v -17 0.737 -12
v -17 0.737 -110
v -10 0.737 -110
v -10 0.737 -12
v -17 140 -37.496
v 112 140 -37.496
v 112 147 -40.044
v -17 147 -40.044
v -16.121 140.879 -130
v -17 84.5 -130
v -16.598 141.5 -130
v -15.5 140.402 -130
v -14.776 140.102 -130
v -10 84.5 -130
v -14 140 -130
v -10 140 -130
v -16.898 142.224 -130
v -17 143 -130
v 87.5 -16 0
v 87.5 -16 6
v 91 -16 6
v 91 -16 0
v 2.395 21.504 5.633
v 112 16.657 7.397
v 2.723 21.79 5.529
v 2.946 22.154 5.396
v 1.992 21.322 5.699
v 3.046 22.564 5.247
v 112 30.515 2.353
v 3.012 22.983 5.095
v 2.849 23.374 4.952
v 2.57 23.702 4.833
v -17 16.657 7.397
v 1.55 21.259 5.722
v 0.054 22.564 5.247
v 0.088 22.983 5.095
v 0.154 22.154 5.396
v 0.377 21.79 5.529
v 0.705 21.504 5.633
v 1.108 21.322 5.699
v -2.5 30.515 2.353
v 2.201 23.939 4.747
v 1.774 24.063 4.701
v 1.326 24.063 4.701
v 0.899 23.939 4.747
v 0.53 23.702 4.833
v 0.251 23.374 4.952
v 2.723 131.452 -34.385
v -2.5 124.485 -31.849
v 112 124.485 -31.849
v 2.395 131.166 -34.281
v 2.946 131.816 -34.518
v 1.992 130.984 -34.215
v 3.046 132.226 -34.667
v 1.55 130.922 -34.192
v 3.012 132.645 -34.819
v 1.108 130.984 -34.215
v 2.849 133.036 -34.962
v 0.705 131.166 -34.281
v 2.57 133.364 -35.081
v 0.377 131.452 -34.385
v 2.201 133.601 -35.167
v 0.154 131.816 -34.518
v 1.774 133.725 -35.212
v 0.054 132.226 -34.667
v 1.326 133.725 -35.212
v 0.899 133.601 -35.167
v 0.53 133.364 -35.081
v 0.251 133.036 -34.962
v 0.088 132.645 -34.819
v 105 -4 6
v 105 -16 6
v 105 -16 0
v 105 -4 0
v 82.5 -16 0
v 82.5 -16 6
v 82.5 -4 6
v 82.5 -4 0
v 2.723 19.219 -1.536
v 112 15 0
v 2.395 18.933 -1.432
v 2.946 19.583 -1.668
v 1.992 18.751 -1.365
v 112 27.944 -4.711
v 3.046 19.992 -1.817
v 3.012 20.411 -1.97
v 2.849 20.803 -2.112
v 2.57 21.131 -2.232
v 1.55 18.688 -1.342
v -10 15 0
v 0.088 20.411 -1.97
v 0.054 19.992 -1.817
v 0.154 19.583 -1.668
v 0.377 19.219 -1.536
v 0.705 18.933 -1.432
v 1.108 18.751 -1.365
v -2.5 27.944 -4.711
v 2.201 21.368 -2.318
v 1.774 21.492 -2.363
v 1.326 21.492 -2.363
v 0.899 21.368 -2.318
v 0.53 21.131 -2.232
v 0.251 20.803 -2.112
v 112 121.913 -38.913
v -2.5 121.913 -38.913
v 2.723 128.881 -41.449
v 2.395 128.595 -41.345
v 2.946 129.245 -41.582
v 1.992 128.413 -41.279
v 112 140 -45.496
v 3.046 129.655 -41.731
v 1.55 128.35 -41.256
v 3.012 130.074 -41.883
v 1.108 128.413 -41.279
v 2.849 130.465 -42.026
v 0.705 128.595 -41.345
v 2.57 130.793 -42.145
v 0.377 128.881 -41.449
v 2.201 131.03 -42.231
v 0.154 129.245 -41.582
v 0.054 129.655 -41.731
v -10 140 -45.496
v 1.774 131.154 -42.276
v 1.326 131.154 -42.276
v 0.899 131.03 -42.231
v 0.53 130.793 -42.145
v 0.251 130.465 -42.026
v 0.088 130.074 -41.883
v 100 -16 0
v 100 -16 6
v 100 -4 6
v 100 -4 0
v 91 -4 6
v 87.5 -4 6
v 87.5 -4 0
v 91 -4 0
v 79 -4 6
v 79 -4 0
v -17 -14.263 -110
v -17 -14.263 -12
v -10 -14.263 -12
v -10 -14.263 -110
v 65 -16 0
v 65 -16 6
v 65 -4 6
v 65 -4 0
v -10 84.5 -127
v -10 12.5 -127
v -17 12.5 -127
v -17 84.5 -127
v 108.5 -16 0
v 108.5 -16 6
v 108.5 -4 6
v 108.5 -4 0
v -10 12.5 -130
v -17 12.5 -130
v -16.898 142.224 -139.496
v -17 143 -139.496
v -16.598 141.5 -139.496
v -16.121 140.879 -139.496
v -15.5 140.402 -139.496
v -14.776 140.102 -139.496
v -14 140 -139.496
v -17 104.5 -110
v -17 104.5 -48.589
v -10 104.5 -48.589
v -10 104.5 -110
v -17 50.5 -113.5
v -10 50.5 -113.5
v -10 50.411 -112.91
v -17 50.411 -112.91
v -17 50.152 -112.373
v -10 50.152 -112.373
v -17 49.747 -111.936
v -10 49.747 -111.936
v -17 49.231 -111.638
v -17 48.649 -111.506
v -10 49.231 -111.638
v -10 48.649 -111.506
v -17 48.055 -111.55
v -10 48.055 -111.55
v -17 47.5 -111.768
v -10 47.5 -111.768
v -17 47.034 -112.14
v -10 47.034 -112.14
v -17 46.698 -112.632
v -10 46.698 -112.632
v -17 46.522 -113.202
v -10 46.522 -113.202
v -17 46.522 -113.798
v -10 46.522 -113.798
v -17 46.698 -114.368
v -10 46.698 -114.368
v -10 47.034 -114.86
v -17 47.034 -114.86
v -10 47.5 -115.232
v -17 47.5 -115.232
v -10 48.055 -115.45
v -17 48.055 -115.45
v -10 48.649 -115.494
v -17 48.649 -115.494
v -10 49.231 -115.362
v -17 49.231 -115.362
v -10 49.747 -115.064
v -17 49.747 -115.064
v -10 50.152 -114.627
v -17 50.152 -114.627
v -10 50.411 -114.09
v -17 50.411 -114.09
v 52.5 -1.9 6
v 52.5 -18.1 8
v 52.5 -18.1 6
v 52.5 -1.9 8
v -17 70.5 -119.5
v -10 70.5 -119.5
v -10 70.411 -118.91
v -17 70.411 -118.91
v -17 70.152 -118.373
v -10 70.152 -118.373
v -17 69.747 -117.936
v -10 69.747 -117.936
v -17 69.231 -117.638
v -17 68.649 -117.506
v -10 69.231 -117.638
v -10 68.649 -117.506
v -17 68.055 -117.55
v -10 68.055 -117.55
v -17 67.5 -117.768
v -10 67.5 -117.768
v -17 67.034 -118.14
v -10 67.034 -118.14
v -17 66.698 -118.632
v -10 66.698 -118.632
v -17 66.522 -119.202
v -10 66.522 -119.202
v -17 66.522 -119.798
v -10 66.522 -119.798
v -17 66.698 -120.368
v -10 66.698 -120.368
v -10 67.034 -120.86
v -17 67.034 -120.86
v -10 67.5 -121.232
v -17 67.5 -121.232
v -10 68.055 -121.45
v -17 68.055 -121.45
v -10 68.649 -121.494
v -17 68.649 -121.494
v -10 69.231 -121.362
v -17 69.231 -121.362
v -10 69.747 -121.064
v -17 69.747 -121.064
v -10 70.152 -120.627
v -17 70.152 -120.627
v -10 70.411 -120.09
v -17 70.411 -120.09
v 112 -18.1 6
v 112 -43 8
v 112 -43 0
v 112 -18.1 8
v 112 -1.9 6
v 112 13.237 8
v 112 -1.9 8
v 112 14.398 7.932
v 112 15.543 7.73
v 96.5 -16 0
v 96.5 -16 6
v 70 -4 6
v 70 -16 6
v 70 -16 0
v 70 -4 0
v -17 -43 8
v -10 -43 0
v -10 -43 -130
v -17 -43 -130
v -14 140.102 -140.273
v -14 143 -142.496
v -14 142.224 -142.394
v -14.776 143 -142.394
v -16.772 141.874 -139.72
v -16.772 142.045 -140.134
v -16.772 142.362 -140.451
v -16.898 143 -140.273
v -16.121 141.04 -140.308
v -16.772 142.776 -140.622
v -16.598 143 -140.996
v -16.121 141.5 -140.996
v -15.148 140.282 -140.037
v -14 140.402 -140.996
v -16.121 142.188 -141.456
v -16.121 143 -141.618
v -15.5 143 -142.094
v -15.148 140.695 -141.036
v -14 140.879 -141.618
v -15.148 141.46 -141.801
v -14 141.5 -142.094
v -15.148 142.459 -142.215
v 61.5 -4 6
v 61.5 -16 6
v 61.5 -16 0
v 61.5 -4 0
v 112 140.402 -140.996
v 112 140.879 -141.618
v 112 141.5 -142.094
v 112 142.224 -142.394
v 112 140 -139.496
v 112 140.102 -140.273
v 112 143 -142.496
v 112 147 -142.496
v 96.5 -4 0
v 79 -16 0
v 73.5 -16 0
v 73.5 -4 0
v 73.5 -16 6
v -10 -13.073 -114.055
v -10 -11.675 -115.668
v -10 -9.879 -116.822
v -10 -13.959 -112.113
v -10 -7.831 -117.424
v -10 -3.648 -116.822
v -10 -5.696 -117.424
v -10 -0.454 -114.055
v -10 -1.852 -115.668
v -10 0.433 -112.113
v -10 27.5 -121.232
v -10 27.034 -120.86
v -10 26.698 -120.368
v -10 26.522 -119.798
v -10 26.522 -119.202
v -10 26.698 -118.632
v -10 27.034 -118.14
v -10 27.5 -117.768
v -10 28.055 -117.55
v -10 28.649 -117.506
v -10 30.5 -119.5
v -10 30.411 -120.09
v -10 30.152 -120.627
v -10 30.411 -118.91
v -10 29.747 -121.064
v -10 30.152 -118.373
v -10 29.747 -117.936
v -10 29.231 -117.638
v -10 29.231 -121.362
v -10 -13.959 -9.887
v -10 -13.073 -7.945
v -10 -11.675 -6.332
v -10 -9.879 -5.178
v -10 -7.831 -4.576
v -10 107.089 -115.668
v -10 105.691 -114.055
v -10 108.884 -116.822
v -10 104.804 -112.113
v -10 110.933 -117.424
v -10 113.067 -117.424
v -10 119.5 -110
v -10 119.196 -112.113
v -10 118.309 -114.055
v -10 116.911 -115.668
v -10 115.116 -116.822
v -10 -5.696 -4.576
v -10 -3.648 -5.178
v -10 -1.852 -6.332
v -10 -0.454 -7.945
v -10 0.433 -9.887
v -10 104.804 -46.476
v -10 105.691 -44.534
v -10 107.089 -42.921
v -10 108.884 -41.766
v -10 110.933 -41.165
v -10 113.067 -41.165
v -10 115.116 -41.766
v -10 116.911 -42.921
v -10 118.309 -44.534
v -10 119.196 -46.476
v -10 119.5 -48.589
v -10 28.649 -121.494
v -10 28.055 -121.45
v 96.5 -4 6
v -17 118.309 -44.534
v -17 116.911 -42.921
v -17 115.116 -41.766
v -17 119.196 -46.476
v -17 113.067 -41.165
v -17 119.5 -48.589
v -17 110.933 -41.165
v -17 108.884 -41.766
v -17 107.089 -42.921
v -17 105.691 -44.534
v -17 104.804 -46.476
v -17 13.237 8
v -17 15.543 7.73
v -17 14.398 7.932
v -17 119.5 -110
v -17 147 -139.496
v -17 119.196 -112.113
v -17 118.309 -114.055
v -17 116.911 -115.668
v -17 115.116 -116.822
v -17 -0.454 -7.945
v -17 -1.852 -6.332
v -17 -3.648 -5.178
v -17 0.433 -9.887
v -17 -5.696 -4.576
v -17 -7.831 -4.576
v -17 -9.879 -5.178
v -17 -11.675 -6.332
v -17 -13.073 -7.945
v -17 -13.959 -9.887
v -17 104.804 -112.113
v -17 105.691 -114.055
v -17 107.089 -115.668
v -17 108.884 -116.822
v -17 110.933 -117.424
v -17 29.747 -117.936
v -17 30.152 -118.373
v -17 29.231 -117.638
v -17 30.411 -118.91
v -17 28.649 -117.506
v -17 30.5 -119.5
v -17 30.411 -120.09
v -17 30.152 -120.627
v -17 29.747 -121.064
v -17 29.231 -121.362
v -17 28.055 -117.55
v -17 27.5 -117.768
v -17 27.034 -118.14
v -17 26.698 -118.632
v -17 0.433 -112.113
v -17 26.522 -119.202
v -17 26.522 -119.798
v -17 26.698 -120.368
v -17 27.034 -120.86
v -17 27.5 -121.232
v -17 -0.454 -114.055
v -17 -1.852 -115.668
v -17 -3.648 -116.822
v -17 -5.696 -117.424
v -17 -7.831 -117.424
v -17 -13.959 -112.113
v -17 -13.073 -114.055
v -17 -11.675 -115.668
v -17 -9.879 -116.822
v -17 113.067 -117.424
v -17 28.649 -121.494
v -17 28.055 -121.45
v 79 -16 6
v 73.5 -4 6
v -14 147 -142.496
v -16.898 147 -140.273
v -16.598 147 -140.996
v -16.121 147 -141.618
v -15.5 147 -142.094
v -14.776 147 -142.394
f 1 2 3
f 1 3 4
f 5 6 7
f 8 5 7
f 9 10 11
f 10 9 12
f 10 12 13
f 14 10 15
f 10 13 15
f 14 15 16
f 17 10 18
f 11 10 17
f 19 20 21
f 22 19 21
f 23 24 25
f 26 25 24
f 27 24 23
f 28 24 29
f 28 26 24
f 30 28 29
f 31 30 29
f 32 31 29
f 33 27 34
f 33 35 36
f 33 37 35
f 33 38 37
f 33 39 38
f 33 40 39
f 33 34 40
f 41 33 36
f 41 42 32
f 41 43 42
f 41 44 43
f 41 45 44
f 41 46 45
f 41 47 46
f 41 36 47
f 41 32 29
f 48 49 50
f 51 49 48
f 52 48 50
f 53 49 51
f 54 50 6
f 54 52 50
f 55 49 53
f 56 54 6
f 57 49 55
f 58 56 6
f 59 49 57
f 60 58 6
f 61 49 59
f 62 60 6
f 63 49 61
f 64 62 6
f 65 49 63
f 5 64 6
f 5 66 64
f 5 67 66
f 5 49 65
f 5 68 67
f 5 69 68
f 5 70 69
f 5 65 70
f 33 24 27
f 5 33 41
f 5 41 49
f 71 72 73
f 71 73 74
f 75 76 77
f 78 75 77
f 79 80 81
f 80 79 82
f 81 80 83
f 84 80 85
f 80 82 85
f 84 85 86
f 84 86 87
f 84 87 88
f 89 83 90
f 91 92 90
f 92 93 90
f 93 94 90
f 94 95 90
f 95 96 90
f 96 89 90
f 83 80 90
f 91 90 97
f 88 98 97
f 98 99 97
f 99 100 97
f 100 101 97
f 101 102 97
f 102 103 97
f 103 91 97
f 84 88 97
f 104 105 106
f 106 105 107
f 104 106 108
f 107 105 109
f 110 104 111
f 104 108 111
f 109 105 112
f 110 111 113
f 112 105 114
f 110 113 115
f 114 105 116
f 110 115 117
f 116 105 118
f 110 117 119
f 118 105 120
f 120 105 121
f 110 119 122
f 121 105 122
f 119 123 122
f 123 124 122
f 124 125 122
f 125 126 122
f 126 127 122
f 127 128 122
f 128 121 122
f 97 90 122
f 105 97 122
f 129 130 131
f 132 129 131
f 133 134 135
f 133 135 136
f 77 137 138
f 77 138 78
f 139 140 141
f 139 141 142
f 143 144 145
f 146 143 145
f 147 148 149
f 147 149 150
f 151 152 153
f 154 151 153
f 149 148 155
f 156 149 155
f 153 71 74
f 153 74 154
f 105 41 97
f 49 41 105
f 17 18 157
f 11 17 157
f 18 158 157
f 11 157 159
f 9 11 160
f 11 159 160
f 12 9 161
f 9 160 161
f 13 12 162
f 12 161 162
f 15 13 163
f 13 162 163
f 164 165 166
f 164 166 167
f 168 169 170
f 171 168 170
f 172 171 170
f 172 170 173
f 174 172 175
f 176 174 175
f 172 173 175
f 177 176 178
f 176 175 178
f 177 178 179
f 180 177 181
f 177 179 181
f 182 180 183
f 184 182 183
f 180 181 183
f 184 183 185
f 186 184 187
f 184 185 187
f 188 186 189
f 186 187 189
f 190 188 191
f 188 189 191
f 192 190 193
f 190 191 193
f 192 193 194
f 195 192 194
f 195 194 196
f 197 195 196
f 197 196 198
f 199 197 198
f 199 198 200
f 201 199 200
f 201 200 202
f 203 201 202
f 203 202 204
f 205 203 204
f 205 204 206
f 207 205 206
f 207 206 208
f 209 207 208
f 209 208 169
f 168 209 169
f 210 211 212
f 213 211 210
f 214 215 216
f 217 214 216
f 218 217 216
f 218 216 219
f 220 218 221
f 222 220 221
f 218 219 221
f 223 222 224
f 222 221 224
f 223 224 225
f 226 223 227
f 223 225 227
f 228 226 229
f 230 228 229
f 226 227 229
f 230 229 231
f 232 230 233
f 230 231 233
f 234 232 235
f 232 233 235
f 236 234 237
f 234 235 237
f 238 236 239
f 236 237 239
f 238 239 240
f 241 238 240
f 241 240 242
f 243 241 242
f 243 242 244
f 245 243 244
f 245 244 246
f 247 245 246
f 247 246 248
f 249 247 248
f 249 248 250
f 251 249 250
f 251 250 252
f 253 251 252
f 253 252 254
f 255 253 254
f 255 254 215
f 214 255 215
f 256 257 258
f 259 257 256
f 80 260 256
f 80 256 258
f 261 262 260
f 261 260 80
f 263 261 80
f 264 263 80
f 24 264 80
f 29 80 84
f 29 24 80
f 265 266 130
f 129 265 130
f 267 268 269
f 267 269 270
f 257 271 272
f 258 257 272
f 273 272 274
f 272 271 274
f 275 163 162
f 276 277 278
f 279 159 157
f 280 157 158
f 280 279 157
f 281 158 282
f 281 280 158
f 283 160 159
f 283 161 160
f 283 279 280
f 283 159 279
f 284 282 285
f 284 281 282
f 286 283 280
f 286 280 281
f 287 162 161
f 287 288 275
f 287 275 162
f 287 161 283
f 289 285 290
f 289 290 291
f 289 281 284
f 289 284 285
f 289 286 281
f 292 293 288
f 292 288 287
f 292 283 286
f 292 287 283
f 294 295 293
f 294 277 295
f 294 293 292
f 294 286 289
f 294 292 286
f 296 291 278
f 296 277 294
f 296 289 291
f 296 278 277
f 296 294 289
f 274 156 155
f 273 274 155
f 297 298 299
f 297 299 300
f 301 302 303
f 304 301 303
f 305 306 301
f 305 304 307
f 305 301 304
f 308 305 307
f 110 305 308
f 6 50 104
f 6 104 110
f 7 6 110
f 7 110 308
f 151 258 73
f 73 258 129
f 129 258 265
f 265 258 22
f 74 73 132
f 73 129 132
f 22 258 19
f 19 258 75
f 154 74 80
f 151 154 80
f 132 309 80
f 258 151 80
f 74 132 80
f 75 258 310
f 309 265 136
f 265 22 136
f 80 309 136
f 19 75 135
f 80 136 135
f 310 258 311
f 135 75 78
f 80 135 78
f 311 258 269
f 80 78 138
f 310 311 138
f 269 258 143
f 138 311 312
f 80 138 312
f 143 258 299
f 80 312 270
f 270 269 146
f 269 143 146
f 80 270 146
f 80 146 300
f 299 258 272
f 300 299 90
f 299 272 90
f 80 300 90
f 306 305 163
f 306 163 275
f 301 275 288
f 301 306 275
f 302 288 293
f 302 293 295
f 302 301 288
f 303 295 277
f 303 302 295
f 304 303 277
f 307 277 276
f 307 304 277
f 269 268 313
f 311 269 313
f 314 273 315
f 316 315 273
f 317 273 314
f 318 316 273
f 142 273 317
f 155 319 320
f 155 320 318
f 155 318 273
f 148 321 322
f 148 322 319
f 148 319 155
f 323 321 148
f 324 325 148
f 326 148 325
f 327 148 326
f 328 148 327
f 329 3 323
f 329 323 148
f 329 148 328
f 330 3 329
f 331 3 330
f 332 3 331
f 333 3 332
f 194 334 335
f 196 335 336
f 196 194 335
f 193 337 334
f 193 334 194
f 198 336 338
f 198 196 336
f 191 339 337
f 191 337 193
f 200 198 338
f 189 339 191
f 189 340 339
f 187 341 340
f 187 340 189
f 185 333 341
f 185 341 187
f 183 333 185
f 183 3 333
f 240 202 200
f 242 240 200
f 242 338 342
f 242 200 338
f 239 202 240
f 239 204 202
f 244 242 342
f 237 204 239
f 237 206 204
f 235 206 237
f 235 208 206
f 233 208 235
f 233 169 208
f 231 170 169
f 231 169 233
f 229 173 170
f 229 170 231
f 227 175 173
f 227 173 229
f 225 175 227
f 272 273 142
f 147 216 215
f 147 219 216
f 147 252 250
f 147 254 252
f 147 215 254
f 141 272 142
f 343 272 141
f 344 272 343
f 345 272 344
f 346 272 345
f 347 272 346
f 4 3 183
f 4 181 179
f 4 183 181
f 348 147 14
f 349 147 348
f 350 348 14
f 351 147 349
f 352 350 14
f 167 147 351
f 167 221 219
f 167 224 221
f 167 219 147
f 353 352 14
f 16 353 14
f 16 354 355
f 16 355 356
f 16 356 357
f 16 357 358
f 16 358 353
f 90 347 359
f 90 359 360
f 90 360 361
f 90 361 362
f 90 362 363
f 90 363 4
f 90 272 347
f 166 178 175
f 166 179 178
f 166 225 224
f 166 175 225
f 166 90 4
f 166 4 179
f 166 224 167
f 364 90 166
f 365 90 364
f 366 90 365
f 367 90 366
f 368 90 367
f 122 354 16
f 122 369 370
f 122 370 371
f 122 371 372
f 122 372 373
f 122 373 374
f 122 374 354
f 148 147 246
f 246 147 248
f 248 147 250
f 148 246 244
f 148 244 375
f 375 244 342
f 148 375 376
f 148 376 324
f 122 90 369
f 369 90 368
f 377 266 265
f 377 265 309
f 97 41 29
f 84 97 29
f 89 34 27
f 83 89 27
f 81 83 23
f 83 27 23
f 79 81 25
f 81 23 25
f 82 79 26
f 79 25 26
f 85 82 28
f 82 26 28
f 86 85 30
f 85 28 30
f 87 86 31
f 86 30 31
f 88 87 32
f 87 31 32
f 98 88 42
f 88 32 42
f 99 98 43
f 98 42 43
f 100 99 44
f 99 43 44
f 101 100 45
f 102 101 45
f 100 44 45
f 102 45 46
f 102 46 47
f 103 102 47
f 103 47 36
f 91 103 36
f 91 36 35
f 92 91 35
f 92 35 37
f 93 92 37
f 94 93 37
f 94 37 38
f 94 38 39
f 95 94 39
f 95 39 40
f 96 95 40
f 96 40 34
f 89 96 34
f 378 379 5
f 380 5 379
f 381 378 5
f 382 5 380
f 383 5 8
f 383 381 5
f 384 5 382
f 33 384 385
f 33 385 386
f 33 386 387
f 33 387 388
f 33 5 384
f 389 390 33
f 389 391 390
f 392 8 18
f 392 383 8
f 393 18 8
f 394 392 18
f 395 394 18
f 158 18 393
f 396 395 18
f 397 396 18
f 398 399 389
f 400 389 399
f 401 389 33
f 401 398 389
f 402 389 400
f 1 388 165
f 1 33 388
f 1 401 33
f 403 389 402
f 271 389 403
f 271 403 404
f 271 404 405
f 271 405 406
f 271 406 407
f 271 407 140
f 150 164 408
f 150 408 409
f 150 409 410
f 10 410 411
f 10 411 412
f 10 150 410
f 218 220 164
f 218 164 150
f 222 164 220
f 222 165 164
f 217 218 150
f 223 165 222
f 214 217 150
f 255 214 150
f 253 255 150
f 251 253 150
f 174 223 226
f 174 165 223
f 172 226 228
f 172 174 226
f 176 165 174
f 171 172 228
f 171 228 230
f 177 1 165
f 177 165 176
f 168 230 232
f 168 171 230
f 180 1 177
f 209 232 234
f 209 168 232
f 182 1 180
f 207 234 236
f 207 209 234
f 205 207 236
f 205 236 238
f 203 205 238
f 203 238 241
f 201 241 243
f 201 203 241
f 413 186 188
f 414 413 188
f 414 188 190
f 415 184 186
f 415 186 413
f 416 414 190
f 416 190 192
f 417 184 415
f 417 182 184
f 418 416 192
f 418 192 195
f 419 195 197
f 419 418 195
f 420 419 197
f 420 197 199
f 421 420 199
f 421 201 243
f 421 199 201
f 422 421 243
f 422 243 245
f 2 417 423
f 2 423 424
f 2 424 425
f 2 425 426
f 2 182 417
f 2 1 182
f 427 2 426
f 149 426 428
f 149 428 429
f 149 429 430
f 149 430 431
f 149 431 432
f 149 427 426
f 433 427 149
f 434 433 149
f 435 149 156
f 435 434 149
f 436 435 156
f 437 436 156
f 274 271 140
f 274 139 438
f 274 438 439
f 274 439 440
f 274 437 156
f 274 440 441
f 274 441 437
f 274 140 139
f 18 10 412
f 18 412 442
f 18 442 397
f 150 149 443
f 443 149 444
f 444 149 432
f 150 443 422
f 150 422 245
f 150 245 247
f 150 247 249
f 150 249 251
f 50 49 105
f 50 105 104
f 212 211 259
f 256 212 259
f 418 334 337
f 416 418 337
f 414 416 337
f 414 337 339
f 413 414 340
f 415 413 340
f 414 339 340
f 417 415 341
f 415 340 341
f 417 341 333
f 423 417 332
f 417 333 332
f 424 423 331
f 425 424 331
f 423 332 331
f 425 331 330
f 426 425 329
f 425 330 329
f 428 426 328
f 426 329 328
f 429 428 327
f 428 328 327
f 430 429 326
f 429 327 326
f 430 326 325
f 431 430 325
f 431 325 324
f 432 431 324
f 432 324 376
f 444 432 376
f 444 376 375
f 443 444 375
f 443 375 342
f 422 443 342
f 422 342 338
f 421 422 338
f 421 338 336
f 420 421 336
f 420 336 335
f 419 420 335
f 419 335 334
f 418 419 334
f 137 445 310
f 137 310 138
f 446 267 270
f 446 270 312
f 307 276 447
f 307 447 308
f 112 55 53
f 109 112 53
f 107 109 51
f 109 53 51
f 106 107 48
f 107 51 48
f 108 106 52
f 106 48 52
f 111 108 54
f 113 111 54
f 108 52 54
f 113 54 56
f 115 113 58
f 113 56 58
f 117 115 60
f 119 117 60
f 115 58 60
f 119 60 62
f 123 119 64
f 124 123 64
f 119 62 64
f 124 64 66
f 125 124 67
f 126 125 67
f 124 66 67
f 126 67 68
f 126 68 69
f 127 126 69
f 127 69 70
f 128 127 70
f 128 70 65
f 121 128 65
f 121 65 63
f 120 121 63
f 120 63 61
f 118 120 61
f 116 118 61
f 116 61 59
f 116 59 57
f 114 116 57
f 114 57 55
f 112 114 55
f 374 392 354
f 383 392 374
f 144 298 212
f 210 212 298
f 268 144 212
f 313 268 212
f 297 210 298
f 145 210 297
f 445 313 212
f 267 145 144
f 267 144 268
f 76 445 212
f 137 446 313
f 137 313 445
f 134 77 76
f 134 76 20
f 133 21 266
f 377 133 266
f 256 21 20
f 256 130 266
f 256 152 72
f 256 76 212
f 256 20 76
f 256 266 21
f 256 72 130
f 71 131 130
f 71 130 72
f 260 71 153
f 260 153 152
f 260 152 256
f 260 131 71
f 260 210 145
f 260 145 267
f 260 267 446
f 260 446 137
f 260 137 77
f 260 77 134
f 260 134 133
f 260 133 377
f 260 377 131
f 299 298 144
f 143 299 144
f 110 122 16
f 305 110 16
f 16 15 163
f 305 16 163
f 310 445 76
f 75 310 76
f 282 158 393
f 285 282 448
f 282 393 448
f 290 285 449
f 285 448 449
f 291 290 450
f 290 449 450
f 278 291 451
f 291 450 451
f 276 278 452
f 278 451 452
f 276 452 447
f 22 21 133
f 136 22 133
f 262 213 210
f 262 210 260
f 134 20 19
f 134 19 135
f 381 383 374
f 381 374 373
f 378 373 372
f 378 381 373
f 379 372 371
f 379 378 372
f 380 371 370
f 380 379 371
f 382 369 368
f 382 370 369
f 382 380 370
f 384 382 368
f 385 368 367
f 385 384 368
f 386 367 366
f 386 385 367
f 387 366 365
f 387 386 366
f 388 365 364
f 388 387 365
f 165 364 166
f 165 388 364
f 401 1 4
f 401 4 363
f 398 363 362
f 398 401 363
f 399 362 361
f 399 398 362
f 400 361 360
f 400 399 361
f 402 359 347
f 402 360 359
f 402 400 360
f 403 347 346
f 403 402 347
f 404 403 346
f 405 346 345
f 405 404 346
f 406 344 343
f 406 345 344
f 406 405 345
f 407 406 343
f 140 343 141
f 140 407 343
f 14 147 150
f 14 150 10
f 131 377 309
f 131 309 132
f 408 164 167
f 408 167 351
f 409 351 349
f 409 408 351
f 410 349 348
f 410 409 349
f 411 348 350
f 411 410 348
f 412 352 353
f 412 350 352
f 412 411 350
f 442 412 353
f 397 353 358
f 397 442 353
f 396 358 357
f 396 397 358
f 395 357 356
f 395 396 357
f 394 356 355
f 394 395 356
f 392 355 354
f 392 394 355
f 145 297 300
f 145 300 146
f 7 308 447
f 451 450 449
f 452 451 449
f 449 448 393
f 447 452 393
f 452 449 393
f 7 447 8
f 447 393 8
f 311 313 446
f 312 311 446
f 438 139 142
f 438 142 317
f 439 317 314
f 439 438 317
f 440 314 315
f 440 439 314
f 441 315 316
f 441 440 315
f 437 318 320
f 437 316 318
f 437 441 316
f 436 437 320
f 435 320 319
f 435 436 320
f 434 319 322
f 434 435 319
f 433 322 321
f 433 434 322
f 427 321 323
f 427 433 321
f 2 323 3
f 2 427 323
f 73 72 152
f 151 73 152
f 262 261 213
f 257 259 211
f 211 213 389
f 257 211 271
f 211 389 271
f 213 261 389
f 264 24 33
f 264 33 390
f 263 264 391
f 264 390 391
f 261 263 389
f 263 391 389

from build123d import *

# Parameters (mm, degrees)
SKETCH1_W                = 170
SKETCH1_H                = 130
BOSS_EXTRUDE1_DEPTH      = 8
SKETCH2_R                = 1.5
SKETCH2_W                = 165
SKETCH2_H                = 100
CUT_EXTRUDE1_DEPTH       = 21
SKETCH3_W                = 170
SKETCH3_H                = 20
BOSS_EXTRUDE2_DEPTH      = 8
SKETCH4_W                = 65
SKETCH4_H                = 16.2
CUT_EXTRUDE2_DEPTH       = 2
SKETCH5_W                = 3.5
SKETCH5_H                = 12
CUT_EXTRUDE3_DEPTH       = 35
SKETCH6_W                = 170
SKETCH6_H                = 150
BOSS_EXTRUDE3_DEPTH      = 8
BOSS_EXTRUDE4_DEPTH      = 138
SKETCH8_W                = 249
SKETCH8_H                = 138
BOSS_EXTRUDE5_DEPTH      = 1
SKETCH9_W                = 72.8
SKETCH9_H                = 73.25
CUT_EXTRUDE4_DEPTH       = 19
BOSS_EXTRUDE6_DEPTH      = 5
SKETCH11_R               = 1.5
CUT_EXTRUDE5_DEPTH       = 56
SKETCH12_R               = 9
SKETCH12_R_2             = 6.5
SKETCH12_R_3             = 1
SKETCH12_R_4             = 2.75
CUT_EXTRUDE6_DEPTH       = 115
SKETCH13_W               = 58.59049163
SKETCH13_H               = 30.075830986
CUT_EXTRUDE7_DEPTH       = 3
FILLET1_R                = 2
SKETCH15_R               = 1.5
CUT_EXTRUDE8_DEPTH       = 10
CUT_EXTRUDE10_DEPTH      = 261
SKETCH19_R               = 1.5
BOSS_EXTRUDE7_DEPTH      = 8
BOSS_EXTRUDE12_START     = -124.5
BOSS_EXTRUDE12_DEPTH     = 249
SKETCH22_R               = 1.5
SKETCH22_W               = 165
SKETCH22_H               = 100
CUT_EXTRUDE11_DEPTH      = 18
FILLET2_R                = 10
SKETCH24_R               = 2
SKETCH24_W               = 3
SKETCH24_H               = 72
CUT_EXTRUDE15_DEPTH      = 42
CUT_EXTRUDE16_DEPTH      = 140
CUT_EXTRUDE16_DEPTH_BACK = 242
SKETCH27_W               = 249
SKETCH27_H               = 105
BOSS_EXTRUDE13_DEPTH     = 7
CUT_EXTRUDE17_DEPTH      = 249
FILLET6_R                = 3
FILLET7_R                = 3
BOSS_EXTRUDE14_DEPTH     = 9
SKETCH30_R               = 1.5
CUT_EXTRUDE18_DEPTH      = 10
SKETCH31_R               = 1.5
CUT_EXTRUDE19_DEPTH      = 49
CUT_EXTRUDE20_DEPTH      = 49
SKETCH33_W               = 129
SKETCH33_H               = 190
CUT_EXTRUDE21_DEPTH      = 200


with BuildPart() as part:
    # Sketch1 → Boss-Extrude1 (new body)
    with BuildSketch(Plane.XY):
        with Locations((85, 65)):
            Rectangle(SKETCH1_W, SKETCH1_H)
    extrude(amount=BOSS_EXTRUDE1_DEPTH)

    # Sketch2 → Cut-Extrude1 (cut)
    with BuildSketch(Plane.XY.offset(8)):
        with Locations((6.55, 123.35)):
            Circle(SKETCH2_R)
        with Locations((163.45, 123.35)):
            Circle(SKETCH2_R)
        with Locations((6.55, 6.65)):
            Circle(SKETCH2_R)
        with Locations((163.45, 6.65)):
            Circle(SKETCH2_R)
        with Locations((85, 65)):
            Rectangle(SKETCH2_W, SKETCH2_H)
    extrude(amount=-CUT_EXTRUDE1_DEPTH, mode=Mode.SUBTRACT)

    # Sketch3 → Boss-Extrude2 (add)
    with BuildSketch(Plane.XY.offset(8)):
        with Locations((85, -10)):
            Rectangle(SKETCH3_W, SKETCH3_H)
    extrude(amount=-BOSS_EXTRUDE2_DEPTH)

    # Sketch4 → Cut-Extrude2 (cut)
    with BuildSketch(Plane.XY.offset(8)):
        with Locations((85, -10)):
            Rectangle(SKETCH4_W, SKETCH4_H)
    extrude(amount=-CUT_EXTRUDE2_DEPTH, mode=Mode.SUBTRACT)

    # Sketch5 → Cut-Extrude3 (cut)
    with BuildSketch(Plane.XY.offset(6)):
        with Locations((63.25, -10)):
            Rectangle(SKETCH5_W, SKETCH5_H)
        with Locations((71.75, -10)):
            Rectangle(SKETCH5_W, SKETCH5_H)
        with Locations((80.75, -10)):
            Rectangle(SKETCH5_W, SKETCH5_H)
        with Locations((89.25, -10)):
            Rectangle(SKETCH5_W, SKETCH5_H)
        with Locations((98.25, -10)):
            Rectangle(SKETCH5_W, SKETCH5_H)
        with Locations((106.75, -10)):
            Rectangle(SKETCH5_W, SKETCH5_H)
    extrude(amount=-CUT_EXTRUDE3_DEPTH, mode=Mode.SUBTRACT)

    # Sketch6 → Boss-Extrude3 (add)
    with BuildSketch(Plane.XY.offset(8)):
        Polygon((15.504384948, 140), (225, 140), (225, -35), (-10, -35), (-10, 140), align=None)
        with Locations((85, 55)):
            Rectangle(SKETCH6_W, SKETCH6_H, mode=Mode.SUBTRACT)
    extrude(amount=-BOSS_EXTRUDE3_DEPTH)

    # Sketch7 → Boss-Extrude4 (add)
    with BuildSketch(Plane.XY.offset(8)):
        Polygon((-10, 140), (-17, 140), (-17, -42), (232, -42), (232, 140), (225, 140), (225, -35), (-10, -35), align=None)
    extrude(amount=-BOSS_EXTRUDE4_DEPTH)

    # Sketch8 → Boss-Extrude5 (add)
    with BuildSketch(Plane.XZ.offset(42)):
        with Locations((107.5, -61)):
            Rectangle(SKETCH8_W, SKETCH8_H)
    extrude(amount=BOSS_EXTRUDE5_DEPTH)

    # Sketch9 → Cut-Extrude4 (cut)
    with BuildSketch(Plane(origin=(232, 0, 0), x_dir=(0, 0, -1), z_dir=(1, 0, 0))):
        with Locations((75, 35)):
            Rectangle(SKETCH9_W, SKETCH9_H)
    extrude(amount=-CUT_EXTRUDE4_DEPTH, mode=Mode.SUBTRACT)

    # Sketch10 → Boss-Extrude6 (add)
    with BuildSketch(Plane(origin=(232, 0, 0), x_dir=(0, 0, -1), z_dir=(1, 0, 0))):
        Polygon((36, 44), (36, -4), (114, -4), (114, 44), (119, 44), (119, -9), (31, -9), (31, 44), align=None)
    extrude(amount=BOSS_EXTRUDE6_DEPTH)

    # Sketch11 → Cut-Extrude5 (cut)
    with BuildSketch(Plane(origin=(237, 0, 0), x_dir=(0, 0, -1), z_dir=(1, 0, 0))):
        with Locations((33.5, 17.5)):
            Circle(SKETCH11_R)
        with Locations((116.5, 17.5)):
            Circle(SKETCH11_R)
    extrude(amount=-CUT_EXTRUDE5_DEPTH, mode=Mode.SUBTRACT)

    # Sketch12 → Cut-Extrude6 (cut)
    with BuildSketch(Plane(origin=(0, -35, 0), x_dir=(1, 0, 0), z_dir=(0, 1, 0))):
        with Locations(Location((166.25, 32.5, 0), (0, 0, 180))):
            Circle(SKETCH12_R)
        with Locations(Location((166.25, 97.5, 0), (0, 0, 180))):
            Circle(SKETCH12_R_2)
        with Locations(Location((155.75, 97.5, 0), (0, 0, 180))):
            Circle(SKETCH12_R_3)
        with Locations(Location((155.75, 85, 0), (0, 0, 180))):
            Circle(SKETCH12_R_3)
        with Locations(Location((176.75, 85, 0), (0, 0, 180))):
            Circle(SKETCH12_R_3)
        with Locations(Location((176.75, 97.5, 0), (0, 0, 180))):
            Circle(SKETCH12_R_3)
        with Locations(Location((145.25, 97.5, 0), (0, 0, 180))):
            Circle(SKETCH12_R_4)
        with Locations(Location((187.25, 97.5, 0), (0, 0, 180))):
            Circle(SKETCH12_R_4)
    extrude(amount=-CUT_EXTRUDE6_DEPTH, mode=Mode.SUBTRACT)

    # Sketch13 → Cut-Extrude7 (cut)
    with BuildSketch(Plane.XZ.offset(43)):
        with Locations((166.25, -93.48757215)):
            Rectangle(SKETCH13_W, SKETCH13_H)
    extrude(amount=-CUT_EXTRUDE7_DEPTH, mode=Mode.SUBTRACT)

    # Fillet1
    fillet1_edges = [part.edges().sort_by_distance(p)[0] for p in [
        (136.954754185, -40, -93.48757215),
        (166.25, -40, -78.449656657),
        (195.545245815, -40, -93.48757215),
        (166.25, -40, -108.525487643),
    ]]
    fillet(fillet1_edges, radius=FILLET1_R)

    # Sketch15 → Cut-Extrude8 (cut)
    with BuildSketch(Plane(origin=(0, 140, 0), x_dir=(1, 0, 0), z_dir=(0, 1, 0))):
        with Locations(Location((5, -4, 0), (0, 0, 270))):
            Circle(SKETCH15_R)
        with Locations(Location((20, -4, 0), (0, 0, 270))):
            Circle(SKETCH15_R)
        with Locations(Location((217, -4, 0), (0, 0, 90))):
            Circle(SKETCH15_R)
        with Locations(Location((202, -4, 0), (0, 0, 90))):
            Circle(SKETCH15_R)
    extrude(amount=-CUT_EXTRUDE8_DEPTH, mode=Mode.SUBTRACT)

    # Sketch18 → Cut-Extrude10 (cut)
    with BuildSketch(Plane(origin=(232, 0, 0), x_dir=(0, 0, -1), z_dir=(1, 0, 0))):
        Polygon((45.496279283, 140), (-8, 140), (-8, 15), (0, 15), align=None)
    extrude(amount=-CUT_EXTRUDE10_DEPTH, mode=Mode.SUBTRACT)

    # Sketch19 → Boss-Extrude7 (add)
    with BuildSketch(Plane.XY.offset(8)):
        with Locations((6.55, 6.65)):
            Circle(SKETCH19_R)
        with Locations((163.45, 6.65)):
            Circle(SKETCH19_R)
    extrude(amount=-BOSS_EXTRUDE7_DEPTH)

    # Sketch21 → Boss-Extrude12 (add)
    with BuildSketch(Plane(origin=(107.5, 0, 0), x_dir=(0, 0, -1), z_dir=(1, 0, 0)).offset(BOSS_EXTRUDE12_START)):
        Polygon((45.496279283, 140), (0, 15), (-8, 15), (37.496279283, 140), align=None)
    extrude(amount=BOSS_EXTRUDE12_DEPTH)

    # Sketch22 → Cut-Extrude11 (cut)
    with BuildSketch(Plane(origin=(0, 4.325817115, 11.885084845), x_dir=(1, 0, 0), z_dir=(0, 0.3420201433256603, 0.9396926207859115))):
        with Locations(Location((1.55, 136.220338945, 0), (0, 0, 270))):
            Circle(SKETCH22_R)
        with Locations(Location((158.45, 136.220338945, 0), (0, 0, 270))):
            Circle(SKETCH22_R)
        with Locations(Location((1.55, 19.520338945, 0), (0, 0, 270))):
            Circle(SKETCH22_R)
        with Locations(Location((158.45, 19.520338945, 0), (0, 0, 270))):
            Circle(SKETCH22_R)
        with Locations((80, 77.870338945)):
            Rectangle(SKETCH22_W, SKETCH22_H)
    extrude(amount=-CUT_EXTRUDE11_DEPTH, mode=Mode.SUBTRACT)

    # Fillet2
    fillet2_edges = [part.edges().sort_by_distance(p)[0] for p in [
        (107.5, 15, 8),
    ]]
    fillet(fillet2_edges, radius=FILLET2_R)

    # Sketch24 → Cut-Extrude15 (cut)
    with BuildSketch(Plane(origin=(-10, 0, 0), x_dir=(0, 0, -1), z_dir=(1, 0, 0))):
        with Locations(Location((113.5, 48.5, 0), (0, 0, 90))):
            Circle(SKETCH24_R)
        with Locations(Location((119.5, 68.5, 0), (0, 0, 90))):
            Circle(SKETCH24_R)
        with Locations(Location((119.5, 28.5, 0), (0, 0, 90))):
            Circle(SKETCH24_R)
        with Locations((128.5, 48.5)):
            Rectangle(SKETCH24_W, SKETCH24_H)
    extrude(amount=-CUT_EXTRUDE15_DEPTH, mode=Mode.SUBTRACT)

    # Sketch25 → Cut-Extrude16 (cut, two sides: drawn at the far end of the back side and taken through both)
    with BuildSketch(Plane(origin=(232, 0, 0), x_dir=(0, 0, -1), z_dir=(1, 0, 0)).offset(-CUT_EXTRUDE16_DEPTH_BACK)):
        Polygon((45.496279283, 140), (130, 140), (130, -43), (0, -43), (0, 15), align=None)
    extrude(amount=CUT_EXTRUDE16_DEPTH + CUT_EXTRUDE16_DEPTH_BACK, mode=Mode.SUBTRACT)

    # Sketch27 → Boss-Extrude13 (add)
    with BuildSketch(Plane(origin=(0, 140, 0), x_dir=(1, 0, 0), z_dir=(0, 1, 0))):
        with Locations((107.5, 89.996279283)):
            Rectangle(SKETCH27_W, SKETCH27_H)
    extrude(amount=BOSS_EXTRUDE13_DEPTH)

    # Sketch28 → Cut-Extrude17 (cut)
    with BuildSketch(Plane(origin=(232, 0, 0), x_dir=(0, 0, -1), z_dir=(1, 0, 0))):
        Polygon((37.496279283, 140), (40.044070923, 147), (37.496279283, 147), align=None)
    extrude(amount=-CUT_EXTRUDE17_DEPTH, mode=Mode.SUBTRACT)

    # Fillet6
    fillet6_edges = [part.edges().sort_by_distance(p)[0] for p in [
        (107.5, 140, -142.496279283),
    ]]
    fillet(fillet6_edges, radius=FILLET6_R)

    # Fillet7
    fillet7_edges = [part.edges().sort_by_distance(p)[0] for p in [
        (-17, 145, -142.496279283),
        (-17, 140, -134.748139642),
        (-17, 140.878679656, -141.617599627),
    ]]
    fillet(fillet7_edges, radius=FILLET7_R)

    # Sketch29 → Boss-Extrude14 (add)
    with BuildSketch(Plane(origin=(232, 0, 0), x_dir=(0, 0, -1), z_dir=(1, 0, 0))):
        with BuildLine():
            Line((-8, -43), (0, -43))
            Line((0, -43), (0, 15))
            Line((0, 15), (45.496279283, 140))
            Line((45.496279283, 140), (139.496279283, 140))
            ThreePointArc((139.496279283, 140), (141.886652657, 140.990125071), (142.876777727, 143.380498444))
            Line((142.876777727, 143.380498444), (142.496279283, 147))
            Line((142.496279283, 147), (40.044070923, 147))
            Line((40.044070923, 147), (-7.396926208, 16.656931626))
            ThreePointArc((-7.396926208, 16.656931626), (-7.84807753, 14.97321197), (-8, 13.236730193))
            Line((-8, 13.236730193), (-8, -43))
        make_face()
    extrude(amount=BOSS_EXTRUDE14_DEPTH)

    # Sketch30 → Cut-Extrude18 (cut)
    with BuildSketch(Plane(origin=(0, 147, 0), x_dir=(1, 0, 0), z_dir=(0, 1, 0))):
        with Locations(Location((218.25, 136.876777727, 0), (0, 0, 270))):
            Circle(SKETCH30_R)
        with Locations(Location((203.25, 136.876777727, 0), (0, 0, 270))):
            Circle(SKETCH30_R)
    extrude(amount=-CUT_EXTRUDE18_DEPTH, mode=Mode.SUBTRACT)

    # Sketch31 → Cut-Extrude19 (cut)
    with BuildSketch(Plane.XY.offset(8)):
        with Locations((219, -39)):
            Circle(SKETCH31_R)
        with Locations((204, -39)):
            Circle(SKETCH31_R)
    extrude(amount=-CUT_EXTRUDE19_DEPTH, mode=Mode.SUBTRACT)

    # Sketch32 → Cut-Extrude20 (cut)
    with BuildSketch(Plane.ZY.offset(17)):
        with BuildLine():
            Line((-110, 0.736730193), (-12, 0.736730193))
            ThreePointArc((-12, 0.736730193), (-4.5, -6.763269807), (-12, -14.263269807))
            Line((-12, -14.263269807), (-110, -14.263269807))
            ThreePointArc((-110, -14.263269807), (-117.5, -6.763269807), (-110, 0.736730193))
        make_face()
        with BuildLine():
            Line((-110, 119.5), (-48.588668173, 119.5))
            ThreePointArc((-48.588668173, 119.5), (-41.088668173, 112), (-48.588668173, 104.5))
            Line((-48.588668173, 104.5), (-110, 104.5))
            ThreePointArc((-110, 104.5), (-117.5, 112), (-110, 119.5))
        make_face()
    extrude(amount=-CUT_EXTRUDE20_DEPTH, mode=Mode.SUBTRACT)

    # Sketch33 → Cut-Extrude21 (cut)
    with BuildSketch(Plane.XY.offset(8)):
        with Locations((176.5, 52)):
            Rectangle(SKETCH33_W, SKETCH33_H)
    extrude(amount=-CUT_EXTRUDE21_DEPTH, mode=Mode.SUBTRACT)


solid = part.part
